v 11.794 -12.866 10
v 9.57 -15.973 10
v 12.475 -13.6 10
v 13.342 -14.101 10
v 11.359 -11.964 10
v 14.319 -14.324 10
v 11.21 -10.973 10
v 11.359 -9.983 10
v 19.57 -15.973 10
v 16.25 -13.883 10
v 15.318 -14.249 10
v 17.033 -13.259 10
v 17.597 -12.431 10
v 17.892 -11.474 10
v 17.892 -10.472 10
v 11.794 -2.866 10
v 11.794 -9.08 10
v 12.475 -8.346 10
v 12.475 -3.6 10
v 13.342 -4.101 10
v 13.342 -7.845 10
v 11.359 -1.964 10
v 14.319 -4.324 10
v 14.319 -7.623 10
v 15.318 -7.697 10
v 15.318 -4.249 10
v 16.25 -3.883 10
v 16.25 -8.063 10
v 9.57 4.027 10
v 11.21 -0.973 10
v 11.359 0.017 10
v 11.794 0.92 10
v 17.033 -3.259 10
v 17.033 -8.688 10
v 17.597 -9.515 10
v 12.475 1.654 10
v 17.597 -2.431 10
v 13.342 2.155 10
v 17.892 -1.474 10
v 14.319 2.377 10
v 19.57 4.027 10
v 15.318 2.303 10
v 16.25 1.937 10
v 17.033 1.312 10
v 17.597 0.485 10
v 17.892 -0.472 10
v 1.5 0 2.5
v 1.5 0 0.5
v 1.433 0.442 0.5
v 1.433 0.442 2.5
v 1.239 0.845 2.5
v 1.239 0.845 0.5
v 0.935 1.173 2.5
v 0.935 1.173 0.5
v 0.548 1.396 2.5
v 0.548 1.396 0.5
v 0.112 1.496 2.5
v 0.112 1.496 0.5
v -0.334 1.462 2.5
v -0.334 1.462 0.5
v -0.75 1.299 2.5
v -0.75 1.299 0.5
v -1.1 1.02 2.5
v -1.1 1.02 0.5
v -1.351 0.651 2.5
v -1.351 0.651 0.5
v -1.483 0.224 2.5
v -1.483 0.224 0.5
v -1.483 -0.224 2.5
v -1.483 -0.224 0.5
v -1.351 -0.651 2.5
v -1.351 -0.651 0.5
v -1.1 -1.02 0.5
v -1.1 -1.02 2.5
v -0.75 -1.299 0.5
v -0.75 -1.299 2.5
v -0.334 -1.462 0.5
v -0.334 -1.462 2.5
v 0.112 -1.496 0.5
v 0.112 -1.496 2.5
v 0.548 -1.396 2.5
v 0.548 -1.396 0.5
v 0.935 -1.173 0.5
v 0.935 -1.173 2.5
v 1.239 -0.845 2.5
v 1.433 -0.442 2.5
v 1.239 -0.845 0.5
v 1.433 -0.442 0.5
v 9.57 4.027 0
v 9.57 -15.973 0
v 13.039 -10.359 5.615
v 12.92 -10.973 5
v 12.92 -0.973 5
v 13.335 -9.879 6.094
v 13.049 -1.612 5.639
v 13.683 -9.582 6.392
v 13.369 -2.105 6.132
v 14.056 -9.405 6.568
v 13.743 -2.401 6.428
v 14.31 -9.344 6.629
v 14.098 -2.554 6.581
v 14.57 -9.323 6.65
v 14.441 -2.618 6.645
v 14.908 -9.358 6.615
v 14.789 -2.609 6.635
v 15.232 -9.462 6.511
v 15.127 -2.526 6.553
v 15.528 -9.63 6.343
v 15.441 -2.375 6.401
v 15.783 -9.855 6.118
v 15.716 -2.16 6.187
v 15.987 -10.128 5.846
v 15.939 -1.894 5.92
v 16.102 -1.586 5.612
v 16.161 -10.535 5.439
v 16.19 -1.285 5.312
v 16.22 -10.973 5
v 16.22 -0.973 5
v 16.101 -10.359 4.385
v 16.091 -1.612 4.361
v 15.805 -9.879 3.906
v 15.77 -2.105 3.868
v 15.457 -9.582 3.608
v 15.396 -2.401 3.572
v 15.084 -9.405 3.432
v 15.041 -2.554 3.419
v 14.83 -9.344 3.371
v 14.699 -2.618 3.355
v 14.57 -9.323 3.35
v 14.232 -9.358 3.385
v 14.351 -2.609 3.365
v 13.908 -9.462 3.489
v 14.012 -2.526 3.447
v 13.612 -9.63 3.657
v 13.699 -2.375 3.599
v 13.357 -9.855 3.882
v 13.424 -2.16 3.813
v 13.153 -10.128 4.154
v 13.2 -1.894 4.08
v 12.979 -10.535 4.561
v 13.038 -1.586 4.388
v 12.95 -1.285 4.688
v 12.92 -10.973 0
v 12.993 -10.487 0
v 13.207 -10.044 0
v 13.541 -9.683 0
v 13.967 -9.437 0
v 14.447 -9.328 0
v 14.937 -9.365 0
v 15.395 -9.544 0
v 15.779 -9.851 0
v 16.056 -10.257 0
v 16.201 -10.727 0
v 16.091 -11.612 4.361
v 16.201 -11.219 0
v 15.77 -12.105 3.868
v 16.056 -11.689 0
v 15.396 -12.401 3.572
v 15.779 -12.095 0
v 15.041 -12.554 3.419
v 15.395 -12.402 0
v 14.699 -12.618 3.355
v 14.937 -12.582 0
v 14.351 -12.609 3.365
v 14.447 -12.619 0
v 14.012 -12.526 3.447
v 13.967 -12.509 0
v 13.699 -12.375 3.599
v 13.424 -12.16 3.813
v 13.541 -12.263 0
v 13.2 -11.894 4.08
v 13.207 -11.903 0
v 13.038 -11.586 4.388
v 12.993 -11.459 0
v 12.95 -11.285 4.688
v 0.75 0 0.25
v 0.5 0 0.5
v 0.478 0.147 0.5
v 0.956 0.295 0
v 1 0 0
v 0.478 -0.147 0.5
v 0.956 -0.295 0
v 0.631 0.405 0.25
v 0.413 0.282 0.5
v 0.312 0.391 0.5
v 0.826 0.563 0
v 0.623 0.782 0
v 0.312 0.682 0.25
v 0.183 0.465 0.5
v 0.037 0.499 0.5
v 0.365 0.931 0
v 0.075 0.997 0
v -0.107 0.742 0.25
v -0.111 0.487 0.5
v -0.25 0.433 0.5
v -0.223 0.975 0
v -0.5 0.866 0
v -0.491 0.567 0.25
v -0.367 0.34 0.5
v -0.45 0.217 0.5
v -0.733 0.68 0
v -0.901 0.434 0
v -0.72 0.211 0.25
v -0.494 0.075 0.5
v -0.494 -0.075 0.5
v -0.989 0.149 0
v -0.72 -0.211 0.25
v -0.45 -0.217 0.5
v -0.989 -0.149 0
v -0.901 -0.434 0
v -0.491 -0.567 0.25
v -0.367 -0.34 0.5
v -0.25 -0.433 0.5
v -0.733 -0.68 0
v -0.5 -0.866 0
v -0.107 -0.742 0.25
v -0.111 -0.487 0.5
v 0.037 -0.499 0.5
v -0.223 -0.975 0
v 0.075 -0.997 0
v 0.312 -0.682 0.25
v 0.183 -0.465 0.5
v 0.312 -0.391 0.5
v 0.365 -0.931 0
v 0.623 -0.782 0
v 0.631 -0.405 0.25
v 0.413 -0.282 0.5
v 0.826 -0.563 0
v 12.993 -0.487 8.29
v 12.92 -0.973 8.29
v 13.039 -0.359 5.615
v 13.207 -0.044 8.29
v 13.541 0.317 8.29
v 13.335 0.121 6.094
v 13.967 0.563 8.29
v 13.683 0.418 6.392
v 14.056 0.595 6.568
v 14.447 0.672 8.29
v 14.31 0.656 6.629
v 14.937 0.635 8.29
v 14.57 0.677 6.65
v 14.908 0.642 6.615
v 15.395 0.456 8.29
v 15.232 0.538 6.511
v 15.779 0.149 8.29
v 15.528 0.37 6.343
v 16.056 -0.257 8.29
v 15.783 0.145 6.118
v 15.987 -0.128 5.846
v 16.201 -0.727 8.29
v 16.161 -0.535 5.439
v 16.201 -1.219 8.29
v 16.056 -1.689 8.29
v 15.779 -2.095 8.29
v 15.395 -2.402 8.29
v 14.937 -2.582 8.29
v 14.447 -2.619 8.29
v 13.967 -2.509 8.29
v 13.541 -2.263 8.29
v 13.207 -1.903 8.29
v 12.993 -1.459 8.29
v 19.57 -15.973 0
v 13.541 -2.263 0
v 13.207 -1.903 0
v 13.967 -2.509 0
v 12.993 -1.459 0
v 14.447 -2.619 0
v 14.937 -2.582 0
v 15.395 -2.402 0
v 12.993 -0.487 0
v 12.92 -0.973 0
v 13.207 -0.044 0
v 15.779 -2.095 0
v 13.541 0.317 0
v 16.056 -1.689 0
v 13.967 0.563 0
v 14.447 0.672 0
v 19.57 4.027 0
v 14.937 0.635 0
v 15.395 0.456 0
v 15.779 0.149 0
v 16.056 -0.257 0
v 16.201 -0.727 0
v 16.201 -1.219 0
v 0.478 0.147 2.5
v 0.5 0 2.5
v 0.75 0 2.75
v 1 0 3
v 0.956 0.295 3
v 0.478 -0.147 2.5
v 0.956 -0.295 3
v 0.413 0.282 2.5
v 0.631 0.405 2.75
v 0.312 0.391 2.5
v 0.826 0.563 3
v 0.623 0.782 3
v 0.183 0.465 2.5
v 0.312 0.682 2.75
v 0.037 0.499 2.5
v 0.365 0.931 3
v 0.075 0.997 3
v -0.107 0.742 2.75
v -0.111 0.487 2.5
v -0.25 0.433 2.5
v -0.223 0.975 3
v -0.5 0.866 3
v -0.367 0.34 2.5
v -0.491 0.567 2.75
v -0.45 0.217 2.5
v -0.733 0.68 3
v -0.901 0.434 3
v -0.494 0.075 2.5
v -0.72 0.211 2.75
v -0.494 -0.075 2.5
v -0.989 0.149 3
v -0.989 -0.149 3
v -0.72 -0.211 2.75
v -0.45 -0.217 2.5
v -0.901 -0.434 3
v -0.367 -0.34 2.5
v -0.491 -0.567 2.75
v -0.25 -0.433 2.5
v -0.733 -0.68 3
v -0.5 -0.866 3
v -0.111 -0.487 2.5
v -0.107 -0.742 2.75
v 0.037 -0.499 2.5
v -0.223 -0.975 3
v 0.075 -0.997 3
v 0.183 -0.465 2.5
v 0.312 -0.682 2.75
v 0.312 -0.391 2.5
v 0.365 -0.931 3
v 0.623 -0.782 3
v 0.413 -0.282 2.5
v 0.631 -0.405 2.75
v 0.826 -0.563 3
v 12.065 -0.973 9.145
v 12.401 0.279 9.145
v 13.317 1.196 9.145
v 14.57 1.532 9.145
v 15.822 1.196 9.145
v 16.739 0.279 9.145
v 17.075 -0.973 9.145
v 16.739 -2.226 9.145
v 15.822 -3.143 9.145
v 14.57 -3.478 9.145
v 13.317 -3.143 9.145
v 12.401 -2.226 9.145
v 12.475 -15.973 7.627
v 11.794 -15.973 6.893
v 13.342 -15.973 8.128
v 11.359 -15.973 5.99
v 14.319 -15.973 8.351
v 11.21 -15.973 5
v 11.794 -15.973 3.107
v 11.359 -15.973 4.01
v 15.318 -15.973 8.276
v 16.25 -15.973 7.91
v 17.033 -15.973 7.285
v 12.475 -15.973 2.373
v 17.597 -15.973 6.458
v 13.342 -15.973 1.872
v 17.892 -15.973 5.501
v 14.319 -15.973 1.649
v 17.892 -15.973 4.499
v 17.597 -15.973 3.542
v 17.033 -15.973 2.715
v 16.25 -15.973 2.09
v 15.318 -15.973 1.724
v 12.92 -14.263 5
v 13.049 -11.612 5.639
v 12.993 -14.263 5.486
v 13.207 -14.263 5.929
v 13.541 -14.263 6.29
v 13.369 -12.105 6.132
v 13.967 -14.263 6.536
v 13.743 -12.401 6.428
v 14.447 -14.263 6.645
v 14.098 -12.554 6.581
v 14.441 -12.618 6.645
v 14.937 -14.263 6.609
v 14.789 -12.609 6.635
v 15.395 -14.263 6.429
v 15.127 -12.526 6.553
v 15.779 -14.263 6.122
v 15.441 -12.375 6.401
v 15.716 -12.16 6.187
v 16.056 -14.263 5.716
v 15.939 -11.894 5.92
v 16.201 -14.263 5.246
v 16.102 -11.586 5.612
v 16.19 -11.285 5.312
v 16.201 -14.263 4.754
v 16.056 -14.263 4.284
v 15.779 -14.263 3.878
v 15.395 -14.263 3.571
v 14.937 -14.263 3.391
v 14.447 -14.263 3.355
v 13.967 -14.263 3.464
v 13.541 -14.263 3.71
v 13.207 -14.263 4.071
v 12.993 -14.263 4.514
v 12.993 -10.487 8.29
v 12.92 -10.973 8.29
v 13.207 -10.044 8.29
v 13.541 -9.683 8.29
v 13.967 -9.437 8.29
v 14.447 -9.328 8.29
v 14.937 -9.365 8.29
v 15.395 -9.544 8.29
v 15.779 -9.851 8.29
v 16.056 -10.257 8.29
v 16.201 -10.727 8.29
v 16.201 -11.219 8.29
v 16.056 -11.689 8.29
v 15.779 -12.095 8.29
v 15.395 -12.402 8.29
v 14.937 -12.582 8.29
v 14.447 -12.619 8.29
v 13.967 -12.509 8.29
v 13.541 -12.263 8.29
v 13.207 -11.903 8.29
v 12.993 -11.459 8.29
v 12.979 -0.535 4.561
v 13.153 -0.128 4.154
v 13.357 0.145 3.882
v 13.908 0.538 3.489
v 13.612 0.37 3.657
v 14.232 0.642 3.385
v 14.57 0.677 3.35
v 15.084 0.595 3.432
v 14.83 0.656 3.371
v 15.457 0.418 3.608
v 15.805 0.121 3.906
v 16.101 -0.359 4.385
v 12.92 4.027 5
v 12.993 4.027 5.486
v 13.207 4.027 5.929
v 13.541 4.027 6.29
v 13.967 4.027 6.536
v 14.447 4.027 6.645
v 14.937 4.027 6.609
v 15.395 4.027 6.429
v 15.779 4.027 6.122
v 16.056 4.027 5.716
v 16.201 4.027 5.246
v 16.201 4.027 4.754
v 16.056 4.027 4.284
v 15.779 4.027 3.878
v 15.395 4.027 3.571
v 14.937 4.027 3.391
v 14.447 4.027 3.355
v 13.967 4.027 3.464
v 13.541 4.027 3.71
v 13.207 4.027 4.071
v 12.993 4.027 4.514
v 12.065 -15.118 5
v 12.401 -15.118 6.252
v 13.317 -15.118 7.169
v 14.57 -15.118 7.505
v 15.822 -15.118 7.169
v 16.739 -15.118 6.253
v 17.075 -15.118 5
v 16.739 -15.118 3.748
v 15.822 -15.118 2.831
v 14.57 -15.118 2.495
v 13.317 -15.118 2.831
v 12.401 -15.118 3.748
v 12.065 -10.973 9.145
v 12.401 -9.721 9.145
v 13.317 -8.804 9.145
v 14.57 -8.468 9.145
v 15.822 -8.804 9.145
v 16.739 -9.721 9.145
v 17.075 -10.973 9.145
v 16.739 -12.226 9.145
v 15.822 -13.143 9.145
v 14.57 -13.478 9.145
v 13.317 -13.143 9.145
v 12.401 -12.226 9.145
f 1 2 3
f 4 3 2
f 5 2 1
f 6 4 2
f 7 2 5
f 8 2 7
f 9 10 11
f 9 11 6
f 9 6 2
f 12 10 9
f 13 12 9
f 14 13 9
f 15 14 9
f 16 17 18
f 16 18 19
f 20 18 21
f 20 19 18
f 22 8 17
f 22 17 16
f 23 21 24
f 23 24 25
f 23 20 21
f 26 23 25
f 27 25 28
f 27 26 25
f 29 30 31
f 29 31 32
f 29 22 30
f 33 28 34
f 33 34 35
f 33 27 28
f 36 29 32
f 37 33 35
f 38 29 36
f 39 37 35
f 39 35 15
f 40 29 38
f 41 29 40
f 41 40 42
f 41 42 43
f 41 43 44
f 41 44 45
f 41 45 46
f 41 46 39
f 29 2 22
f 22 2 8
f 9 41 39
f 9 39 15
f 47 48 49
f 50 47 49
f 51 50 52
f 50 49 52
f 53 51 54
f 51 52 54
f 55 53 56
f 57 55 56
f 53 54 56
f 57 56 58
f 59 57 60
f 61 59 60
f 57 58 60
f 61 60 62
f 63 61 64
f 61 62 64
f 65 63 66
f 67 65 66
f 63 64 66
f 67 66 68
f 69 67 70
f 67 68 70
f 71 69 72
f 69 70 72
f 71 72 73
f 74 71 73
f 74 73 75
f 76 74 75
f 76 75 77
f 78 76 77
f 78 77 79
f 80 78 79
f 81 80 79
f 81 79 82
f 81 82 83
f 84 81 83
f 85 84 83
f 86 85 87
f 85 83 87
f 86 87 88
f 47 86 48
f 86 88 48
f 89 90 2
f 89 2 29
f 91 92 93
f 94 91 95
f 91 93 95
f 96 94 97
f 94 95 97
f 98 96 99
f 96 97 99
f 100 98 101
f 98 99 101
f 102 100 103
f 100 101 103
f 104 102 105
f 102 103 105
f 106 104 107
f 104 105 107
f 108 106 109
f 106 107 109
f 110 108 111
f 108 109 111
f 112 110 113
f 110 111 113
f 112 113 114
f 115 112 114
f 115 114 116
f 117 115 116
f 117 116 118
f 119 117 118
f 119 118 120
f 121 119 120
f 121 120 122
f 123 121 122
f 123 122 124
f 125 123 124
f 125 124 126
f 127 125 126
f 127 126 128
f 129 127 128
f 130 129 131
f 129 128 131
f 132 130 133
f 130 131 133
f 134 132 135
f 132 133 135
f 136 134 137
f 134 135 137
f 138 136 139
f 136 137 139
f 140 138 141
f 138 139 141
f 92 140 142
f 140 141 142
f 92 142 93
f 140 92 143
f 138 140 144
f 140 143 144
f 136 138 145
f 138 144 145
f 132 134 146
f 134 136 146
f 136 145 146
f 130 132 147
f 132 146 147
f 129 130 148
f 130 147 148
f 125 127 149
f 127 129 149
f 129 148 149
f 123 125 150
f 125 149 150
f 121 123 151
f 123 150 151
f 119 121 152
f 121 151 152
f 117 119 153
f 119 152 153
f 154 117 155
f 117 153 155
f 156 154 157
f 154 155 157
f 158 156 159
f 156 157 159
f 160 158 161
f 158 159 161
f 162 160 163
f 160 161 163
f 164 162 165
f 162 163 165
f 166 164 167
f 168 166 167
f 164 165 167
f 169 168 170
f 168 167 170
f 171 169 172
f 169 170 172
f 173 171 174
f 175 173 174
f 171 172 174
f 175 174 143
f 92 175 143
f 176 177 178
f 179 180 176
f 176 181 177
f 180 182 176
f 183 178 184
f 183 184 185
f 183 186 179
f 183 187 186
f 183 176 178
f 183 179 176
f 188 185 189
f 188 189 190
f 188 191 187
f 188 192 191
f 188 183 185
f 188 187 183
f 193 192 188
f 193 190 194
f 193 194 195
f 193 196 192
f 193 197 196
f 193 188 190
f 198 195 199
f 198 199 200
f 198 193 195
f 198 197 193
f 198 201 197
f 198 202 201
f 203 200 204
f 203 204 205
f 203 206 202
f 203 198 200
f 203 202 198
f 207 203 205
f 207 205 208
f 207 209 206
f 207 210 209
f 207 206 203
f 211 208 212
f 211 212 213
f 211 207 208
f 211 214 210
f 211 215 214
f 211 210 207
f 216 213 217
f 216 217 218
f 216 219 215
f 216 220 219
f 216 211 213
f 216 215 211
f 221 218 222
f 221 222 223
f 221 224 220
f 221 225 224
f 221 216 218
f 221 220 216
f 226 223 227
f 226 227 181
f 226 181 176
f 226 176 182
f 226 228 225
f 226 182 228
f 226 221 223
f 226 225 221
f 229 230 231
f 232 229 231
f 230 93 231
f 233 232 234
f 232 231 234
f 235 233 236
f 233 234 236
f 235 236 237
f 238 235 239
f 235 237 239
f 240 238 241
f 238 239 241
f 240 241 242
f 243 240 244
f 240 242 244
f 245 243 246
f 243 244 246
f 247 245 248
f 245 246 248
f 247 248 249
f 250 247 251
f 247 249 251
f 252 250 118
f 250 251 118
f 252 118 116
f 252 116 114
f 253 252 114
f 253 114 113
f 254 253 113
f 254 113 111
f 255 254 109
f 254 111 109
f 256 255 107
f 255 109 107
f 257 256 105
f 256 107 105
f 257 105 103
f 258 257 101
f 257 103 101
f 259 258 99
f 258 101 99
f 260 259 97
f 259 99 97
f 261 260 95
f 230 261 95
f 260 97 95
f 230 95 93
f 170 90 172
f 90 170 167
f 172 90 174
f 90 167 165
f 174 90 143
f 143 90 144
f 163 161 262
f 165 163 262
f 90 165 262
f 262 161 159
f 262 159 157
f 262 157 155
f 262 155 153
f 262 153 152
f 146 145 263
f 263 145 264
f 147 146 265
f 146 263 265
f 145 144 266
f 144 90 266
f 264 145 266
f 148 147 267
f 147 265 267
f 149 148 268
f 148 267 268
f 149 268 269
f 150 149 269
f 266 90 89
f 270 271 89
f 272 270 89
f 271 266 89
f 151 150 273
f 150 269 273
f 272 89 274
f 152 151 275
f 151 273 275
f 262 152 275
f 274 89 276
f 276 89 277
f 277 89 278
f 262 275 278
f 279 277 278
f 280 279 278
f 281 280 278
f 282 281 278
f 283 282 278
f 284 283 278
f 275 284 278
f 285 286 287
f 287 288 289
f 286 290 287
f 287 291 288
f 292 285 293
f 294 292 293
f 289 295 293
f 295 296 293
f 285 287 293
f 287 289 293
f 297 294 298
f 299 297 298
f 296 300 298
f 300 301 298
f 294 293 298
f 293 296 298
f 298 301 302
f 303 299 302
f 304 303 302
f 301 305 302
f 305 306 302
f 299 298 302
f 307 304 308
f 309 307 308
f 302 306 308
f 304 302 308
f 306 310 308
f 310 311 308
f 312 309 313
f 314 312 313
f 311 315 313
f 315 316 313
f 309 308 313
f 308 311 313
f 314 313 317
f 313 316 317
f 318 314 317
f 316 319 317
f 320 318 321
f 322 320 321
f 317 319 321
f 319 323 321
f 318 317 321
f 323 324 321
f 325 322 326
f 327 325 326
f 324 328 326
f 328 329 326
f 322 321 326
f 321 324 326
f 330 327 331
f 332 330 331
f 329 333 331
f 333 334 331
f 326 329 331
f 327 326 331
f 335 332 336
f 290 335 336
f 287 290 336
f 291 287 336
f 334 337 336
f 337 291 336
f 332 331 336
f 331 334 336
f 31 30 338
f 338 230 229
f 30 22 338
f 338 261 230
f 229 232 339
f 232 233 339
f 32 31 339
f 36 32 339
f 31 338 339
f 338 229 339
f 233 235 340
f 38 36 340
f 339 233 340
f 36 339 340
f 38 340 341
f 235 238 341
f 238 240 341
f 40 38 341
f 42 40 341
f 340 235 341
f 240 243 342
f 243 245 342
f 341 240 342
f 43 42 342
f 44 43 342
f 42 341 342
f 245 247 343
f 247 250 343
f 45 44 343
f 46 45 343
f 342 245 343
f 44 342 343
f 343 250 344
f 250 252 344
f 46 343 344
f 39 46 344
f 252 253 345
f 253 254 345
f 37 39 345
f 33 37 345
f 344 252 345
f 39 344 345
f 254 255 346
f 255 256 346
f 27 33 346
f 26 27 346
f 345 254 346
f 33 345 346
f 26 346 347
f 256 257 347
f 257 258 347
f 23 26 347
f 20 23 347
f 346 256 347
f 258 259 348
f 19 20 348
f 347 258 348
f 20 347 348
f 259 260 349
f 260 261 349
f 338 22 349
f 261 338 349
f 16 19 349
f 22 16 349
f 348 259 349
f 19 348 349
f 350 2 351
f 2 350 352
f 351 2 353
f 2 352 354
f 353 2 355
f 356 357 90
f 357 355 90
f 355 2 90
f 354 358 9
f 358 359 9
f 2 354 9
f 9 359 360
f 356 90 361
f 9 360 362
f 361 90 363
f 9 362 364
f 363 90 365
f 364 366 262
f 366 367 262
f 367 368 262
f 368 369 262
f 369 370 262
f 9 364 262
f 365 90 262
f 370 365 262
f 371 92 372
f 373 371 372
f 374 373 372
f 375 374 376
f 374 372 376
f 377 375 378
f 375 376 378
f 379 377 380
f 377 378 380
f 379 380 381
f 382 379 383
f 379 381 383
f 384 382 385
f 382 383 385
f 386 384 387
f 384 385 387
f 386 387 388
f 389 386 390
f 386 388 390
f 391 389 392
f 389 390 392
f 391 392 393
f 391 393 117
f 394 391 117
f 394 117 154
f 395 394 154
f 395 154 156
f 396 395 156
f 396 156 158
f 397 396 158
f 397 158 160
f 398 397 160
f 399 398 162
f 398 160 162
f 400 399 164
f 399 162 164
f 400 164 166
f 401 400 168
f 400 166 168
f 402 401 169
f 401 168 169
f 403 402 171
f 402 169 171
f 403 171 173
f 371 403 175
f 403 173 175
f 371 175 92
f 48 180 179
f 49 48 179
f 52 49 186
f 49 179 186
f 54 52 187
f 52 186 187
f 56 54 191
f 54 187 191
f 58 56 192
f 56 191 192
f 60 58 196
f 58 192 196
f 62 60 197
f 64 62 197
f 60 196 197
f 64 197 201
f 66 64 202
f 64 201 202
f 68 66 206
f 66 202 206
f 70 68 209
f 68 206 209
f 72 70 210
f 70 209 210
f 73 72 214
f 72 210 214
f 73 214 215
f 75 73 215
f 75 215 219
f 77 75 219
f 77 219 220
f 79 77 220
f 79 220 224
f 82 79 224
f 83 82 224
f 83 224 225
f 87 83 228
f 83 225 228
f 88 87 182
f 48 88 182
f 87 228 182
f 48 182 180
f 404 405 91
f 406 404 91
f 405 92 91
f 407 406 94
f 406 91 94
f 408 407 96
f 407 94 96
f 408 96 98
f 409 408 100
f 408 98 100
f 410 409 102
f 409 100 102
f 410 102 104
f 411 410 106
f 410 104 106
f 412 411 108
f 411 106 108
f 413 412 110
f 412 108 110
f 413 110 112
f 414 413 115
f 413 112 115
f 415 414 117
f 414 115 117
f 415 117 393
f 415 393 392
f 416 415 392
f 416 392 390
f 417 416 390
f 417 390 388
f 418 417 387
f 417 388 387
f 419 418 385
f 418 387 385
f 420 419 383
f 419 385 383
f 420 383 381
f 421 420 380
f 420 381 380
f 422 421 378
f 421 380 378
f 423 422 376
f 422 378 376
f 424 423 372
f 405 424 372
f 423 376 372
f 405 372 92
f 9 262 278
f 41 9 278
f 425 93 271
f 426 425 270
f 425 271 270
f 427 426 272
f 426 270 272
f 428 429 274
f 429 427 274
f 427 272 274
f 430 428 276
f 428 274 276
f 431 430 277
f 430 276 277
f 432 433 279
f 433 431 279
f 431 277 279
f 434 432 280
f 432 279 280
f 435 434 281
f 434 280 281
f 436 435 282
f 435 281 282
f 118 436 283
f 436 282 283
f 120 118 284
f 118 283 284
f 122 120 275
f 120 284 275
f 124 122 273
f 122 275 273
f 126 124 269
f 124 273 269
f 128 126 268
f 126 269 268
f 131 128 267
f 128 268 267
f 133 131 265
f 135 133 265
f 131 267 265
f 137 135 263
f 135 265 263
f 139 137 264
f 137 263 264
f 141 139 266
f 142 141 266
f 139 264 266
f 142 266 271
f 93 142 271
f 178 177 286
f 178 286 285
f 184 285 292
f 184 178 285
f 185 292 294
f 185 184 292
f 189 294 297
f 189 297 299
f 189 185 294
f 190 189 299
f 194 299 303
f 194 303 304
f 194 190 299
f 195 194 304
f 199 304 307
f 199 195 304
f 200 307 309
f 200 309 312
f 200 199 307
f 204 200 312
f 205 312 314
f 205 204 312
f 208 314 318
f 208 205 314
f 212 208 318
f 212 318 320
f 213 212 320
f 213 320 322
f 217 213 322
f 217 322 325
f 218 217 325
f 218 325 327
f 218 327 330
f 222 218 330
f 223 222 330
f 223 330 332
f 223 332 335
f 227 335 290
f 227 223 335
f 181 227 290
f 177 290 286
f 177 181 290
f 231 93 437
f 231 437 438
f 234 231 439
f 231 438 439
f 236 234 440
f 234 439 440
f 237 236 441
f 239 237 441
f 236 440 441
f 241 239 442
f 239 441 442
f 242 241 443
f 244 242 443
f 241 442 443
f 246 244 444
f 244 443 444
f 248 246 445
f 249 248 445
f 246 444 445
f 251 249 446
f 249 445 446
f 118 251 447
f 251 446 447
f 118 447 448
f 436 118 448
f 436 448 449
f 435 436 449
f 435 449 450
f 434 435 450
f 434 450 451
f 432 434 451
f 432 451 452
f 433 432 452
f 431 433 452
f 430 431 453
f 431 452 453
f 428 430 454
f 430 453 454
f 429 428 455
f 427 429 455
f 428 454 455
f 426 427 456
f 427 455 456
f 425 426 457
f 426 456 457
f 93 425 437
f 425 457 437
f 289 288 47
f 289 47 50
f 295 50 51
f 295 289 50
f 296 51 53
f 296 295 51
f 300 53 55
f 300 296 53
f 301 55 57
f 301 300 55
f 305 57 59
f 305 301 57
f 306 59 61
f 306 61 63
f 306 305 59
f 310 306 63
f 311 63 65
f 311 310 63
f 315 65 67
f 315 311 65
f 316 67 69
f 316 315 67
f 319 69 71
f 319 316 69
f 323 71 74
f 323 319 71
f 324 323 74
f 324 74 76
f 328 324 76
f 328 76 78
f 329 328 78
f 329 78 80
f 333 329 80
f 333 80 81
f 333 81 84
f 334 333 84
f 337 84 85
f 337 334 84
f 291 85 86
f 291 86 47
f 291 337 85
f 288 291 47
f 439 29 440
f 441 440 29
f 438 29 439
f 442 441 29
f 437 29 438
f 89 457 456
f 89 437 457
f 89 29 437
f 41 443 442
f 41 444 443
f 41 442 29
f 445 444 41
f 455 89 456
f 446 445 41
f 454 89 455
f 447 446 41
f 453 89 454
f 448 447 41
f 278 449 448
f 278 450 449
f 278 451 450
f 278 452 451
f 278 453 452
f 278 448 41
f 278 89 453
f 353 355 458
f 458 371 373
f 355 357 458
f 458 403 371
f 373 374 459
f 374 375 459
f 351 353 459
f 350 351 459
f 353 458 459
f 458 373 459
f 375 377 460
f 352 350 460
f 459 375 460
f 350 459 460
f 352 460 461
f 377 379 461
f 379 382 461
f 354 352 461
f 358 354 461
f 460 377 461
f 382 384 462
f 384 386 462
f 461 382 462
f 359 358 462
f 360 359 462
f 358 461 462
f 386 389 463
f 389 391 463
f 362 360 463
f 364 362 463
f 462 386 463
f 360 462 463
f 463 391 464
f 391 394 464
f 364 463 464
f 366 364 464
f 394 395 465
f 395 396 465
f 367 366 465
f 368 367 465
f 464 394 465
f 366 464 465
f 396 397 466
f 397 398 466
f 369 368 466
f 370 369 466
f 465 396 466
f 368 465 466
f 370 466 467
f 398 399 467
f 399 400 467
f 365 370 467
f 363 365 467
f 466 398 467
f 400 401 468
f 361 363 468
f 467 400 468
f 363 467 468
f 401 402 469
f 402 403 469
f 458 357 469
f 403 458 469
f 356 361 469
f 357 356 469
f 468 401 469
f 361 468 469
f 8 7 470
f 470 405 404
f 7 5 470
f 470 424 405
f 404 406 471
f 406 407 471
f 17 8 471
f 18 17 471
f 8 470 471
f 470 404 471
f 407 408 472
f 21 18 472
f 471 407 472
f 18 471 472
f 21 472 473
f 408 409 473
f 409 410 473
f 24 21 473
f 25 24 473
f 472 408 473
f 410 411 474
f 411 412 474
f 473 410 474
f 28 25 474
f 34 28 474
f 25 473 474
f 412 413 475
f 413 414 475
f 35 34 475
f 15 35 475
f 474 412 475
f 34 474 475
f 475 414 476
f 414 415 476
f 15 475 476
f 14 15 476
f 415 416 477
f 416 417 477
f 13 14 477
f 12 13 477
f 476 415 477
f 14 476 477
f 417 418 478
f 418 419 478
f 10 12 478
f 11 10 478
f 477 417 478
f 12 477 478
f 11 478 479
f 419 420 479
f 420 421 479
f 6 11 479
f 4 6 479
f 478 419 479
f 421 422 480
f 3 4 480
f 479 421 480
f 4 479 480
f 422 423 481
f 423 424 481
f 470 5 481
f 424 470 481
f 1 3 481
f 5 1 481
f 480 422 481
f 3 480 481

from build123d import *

# Parameters (mm, degrees)
F1_R           = 1.5
F1_R_2         = 0.5
F2_DEPTH       = 3
F3_SIZE        = 0.49999
F4_W           = 10
F4_H           = 20
F5_DEPTH       = 10
F7_D           = 3.3
F7_CSINK_D     = 6.72
F7_CSINK_ANGLE = 90
F9_D           = 3.3
F9_CSINK_D     = 6.72
F9_CSINK_ANGLE = 90


# Not quite as in the source:
# - a fillet or chamfer is up to 0.001 mm smaller than in the source, because OpenCascade refuses the exact size


with BuildPart() as f2:
    # F1 (on Top) → F2 (new body)
    with BuildSketch(Plane.XY):
        Circle(F1_R)
        Circle(F1_R_2, mode=Mode.SUBTRACT)
    extrude(amount=F2_DEPTH)

    # F3 (size 0.5 in the source; OpenCascade refuses exactly that, so slightly less here)
    f3_edges = [f2.edges().sort_by_distance(p)[0] for p in [
        (-0.5, 0, 3),
        (-1.5, 0, 3),
        (-1.5, 0, 0),
        (-0.5, 0, 0),
    ]]
    chamfer(f3_edges, length=F3_SIZE)


with BuildPart() as f5:
    # F4 (on Top) → F5 (new body)
    with BuildSketch(Plane.XY):
        with Locations((14.5698995329, -5.9731390672)):
            Rectangle(F4_W, F4_H)
    extrude(amount=F5_DEPTH)

    # F7 (through all)
    with Locations(Plane.XZ.offset(15.9731390672)):
        with Locations((14.5698995329, 5)):
            CounterSinkHole(F7_D / 2, F7_CSINK_D / 2, counter_sink_angle=F7_CSINK_ANGLE)

    # F9 (through all)
    with Locations(Plane.XY.offset(10)):
        with Locations((14.5698995329, -10.9731390672), (14.5698995329, -0.9731390672)):
            CounterSinkHole(F9_D / 2, F9_CSINK_D / 2, counter_sink_angle=F9_CSINK_ANGLE)


solid = Compound([f2.part, f5.part])
